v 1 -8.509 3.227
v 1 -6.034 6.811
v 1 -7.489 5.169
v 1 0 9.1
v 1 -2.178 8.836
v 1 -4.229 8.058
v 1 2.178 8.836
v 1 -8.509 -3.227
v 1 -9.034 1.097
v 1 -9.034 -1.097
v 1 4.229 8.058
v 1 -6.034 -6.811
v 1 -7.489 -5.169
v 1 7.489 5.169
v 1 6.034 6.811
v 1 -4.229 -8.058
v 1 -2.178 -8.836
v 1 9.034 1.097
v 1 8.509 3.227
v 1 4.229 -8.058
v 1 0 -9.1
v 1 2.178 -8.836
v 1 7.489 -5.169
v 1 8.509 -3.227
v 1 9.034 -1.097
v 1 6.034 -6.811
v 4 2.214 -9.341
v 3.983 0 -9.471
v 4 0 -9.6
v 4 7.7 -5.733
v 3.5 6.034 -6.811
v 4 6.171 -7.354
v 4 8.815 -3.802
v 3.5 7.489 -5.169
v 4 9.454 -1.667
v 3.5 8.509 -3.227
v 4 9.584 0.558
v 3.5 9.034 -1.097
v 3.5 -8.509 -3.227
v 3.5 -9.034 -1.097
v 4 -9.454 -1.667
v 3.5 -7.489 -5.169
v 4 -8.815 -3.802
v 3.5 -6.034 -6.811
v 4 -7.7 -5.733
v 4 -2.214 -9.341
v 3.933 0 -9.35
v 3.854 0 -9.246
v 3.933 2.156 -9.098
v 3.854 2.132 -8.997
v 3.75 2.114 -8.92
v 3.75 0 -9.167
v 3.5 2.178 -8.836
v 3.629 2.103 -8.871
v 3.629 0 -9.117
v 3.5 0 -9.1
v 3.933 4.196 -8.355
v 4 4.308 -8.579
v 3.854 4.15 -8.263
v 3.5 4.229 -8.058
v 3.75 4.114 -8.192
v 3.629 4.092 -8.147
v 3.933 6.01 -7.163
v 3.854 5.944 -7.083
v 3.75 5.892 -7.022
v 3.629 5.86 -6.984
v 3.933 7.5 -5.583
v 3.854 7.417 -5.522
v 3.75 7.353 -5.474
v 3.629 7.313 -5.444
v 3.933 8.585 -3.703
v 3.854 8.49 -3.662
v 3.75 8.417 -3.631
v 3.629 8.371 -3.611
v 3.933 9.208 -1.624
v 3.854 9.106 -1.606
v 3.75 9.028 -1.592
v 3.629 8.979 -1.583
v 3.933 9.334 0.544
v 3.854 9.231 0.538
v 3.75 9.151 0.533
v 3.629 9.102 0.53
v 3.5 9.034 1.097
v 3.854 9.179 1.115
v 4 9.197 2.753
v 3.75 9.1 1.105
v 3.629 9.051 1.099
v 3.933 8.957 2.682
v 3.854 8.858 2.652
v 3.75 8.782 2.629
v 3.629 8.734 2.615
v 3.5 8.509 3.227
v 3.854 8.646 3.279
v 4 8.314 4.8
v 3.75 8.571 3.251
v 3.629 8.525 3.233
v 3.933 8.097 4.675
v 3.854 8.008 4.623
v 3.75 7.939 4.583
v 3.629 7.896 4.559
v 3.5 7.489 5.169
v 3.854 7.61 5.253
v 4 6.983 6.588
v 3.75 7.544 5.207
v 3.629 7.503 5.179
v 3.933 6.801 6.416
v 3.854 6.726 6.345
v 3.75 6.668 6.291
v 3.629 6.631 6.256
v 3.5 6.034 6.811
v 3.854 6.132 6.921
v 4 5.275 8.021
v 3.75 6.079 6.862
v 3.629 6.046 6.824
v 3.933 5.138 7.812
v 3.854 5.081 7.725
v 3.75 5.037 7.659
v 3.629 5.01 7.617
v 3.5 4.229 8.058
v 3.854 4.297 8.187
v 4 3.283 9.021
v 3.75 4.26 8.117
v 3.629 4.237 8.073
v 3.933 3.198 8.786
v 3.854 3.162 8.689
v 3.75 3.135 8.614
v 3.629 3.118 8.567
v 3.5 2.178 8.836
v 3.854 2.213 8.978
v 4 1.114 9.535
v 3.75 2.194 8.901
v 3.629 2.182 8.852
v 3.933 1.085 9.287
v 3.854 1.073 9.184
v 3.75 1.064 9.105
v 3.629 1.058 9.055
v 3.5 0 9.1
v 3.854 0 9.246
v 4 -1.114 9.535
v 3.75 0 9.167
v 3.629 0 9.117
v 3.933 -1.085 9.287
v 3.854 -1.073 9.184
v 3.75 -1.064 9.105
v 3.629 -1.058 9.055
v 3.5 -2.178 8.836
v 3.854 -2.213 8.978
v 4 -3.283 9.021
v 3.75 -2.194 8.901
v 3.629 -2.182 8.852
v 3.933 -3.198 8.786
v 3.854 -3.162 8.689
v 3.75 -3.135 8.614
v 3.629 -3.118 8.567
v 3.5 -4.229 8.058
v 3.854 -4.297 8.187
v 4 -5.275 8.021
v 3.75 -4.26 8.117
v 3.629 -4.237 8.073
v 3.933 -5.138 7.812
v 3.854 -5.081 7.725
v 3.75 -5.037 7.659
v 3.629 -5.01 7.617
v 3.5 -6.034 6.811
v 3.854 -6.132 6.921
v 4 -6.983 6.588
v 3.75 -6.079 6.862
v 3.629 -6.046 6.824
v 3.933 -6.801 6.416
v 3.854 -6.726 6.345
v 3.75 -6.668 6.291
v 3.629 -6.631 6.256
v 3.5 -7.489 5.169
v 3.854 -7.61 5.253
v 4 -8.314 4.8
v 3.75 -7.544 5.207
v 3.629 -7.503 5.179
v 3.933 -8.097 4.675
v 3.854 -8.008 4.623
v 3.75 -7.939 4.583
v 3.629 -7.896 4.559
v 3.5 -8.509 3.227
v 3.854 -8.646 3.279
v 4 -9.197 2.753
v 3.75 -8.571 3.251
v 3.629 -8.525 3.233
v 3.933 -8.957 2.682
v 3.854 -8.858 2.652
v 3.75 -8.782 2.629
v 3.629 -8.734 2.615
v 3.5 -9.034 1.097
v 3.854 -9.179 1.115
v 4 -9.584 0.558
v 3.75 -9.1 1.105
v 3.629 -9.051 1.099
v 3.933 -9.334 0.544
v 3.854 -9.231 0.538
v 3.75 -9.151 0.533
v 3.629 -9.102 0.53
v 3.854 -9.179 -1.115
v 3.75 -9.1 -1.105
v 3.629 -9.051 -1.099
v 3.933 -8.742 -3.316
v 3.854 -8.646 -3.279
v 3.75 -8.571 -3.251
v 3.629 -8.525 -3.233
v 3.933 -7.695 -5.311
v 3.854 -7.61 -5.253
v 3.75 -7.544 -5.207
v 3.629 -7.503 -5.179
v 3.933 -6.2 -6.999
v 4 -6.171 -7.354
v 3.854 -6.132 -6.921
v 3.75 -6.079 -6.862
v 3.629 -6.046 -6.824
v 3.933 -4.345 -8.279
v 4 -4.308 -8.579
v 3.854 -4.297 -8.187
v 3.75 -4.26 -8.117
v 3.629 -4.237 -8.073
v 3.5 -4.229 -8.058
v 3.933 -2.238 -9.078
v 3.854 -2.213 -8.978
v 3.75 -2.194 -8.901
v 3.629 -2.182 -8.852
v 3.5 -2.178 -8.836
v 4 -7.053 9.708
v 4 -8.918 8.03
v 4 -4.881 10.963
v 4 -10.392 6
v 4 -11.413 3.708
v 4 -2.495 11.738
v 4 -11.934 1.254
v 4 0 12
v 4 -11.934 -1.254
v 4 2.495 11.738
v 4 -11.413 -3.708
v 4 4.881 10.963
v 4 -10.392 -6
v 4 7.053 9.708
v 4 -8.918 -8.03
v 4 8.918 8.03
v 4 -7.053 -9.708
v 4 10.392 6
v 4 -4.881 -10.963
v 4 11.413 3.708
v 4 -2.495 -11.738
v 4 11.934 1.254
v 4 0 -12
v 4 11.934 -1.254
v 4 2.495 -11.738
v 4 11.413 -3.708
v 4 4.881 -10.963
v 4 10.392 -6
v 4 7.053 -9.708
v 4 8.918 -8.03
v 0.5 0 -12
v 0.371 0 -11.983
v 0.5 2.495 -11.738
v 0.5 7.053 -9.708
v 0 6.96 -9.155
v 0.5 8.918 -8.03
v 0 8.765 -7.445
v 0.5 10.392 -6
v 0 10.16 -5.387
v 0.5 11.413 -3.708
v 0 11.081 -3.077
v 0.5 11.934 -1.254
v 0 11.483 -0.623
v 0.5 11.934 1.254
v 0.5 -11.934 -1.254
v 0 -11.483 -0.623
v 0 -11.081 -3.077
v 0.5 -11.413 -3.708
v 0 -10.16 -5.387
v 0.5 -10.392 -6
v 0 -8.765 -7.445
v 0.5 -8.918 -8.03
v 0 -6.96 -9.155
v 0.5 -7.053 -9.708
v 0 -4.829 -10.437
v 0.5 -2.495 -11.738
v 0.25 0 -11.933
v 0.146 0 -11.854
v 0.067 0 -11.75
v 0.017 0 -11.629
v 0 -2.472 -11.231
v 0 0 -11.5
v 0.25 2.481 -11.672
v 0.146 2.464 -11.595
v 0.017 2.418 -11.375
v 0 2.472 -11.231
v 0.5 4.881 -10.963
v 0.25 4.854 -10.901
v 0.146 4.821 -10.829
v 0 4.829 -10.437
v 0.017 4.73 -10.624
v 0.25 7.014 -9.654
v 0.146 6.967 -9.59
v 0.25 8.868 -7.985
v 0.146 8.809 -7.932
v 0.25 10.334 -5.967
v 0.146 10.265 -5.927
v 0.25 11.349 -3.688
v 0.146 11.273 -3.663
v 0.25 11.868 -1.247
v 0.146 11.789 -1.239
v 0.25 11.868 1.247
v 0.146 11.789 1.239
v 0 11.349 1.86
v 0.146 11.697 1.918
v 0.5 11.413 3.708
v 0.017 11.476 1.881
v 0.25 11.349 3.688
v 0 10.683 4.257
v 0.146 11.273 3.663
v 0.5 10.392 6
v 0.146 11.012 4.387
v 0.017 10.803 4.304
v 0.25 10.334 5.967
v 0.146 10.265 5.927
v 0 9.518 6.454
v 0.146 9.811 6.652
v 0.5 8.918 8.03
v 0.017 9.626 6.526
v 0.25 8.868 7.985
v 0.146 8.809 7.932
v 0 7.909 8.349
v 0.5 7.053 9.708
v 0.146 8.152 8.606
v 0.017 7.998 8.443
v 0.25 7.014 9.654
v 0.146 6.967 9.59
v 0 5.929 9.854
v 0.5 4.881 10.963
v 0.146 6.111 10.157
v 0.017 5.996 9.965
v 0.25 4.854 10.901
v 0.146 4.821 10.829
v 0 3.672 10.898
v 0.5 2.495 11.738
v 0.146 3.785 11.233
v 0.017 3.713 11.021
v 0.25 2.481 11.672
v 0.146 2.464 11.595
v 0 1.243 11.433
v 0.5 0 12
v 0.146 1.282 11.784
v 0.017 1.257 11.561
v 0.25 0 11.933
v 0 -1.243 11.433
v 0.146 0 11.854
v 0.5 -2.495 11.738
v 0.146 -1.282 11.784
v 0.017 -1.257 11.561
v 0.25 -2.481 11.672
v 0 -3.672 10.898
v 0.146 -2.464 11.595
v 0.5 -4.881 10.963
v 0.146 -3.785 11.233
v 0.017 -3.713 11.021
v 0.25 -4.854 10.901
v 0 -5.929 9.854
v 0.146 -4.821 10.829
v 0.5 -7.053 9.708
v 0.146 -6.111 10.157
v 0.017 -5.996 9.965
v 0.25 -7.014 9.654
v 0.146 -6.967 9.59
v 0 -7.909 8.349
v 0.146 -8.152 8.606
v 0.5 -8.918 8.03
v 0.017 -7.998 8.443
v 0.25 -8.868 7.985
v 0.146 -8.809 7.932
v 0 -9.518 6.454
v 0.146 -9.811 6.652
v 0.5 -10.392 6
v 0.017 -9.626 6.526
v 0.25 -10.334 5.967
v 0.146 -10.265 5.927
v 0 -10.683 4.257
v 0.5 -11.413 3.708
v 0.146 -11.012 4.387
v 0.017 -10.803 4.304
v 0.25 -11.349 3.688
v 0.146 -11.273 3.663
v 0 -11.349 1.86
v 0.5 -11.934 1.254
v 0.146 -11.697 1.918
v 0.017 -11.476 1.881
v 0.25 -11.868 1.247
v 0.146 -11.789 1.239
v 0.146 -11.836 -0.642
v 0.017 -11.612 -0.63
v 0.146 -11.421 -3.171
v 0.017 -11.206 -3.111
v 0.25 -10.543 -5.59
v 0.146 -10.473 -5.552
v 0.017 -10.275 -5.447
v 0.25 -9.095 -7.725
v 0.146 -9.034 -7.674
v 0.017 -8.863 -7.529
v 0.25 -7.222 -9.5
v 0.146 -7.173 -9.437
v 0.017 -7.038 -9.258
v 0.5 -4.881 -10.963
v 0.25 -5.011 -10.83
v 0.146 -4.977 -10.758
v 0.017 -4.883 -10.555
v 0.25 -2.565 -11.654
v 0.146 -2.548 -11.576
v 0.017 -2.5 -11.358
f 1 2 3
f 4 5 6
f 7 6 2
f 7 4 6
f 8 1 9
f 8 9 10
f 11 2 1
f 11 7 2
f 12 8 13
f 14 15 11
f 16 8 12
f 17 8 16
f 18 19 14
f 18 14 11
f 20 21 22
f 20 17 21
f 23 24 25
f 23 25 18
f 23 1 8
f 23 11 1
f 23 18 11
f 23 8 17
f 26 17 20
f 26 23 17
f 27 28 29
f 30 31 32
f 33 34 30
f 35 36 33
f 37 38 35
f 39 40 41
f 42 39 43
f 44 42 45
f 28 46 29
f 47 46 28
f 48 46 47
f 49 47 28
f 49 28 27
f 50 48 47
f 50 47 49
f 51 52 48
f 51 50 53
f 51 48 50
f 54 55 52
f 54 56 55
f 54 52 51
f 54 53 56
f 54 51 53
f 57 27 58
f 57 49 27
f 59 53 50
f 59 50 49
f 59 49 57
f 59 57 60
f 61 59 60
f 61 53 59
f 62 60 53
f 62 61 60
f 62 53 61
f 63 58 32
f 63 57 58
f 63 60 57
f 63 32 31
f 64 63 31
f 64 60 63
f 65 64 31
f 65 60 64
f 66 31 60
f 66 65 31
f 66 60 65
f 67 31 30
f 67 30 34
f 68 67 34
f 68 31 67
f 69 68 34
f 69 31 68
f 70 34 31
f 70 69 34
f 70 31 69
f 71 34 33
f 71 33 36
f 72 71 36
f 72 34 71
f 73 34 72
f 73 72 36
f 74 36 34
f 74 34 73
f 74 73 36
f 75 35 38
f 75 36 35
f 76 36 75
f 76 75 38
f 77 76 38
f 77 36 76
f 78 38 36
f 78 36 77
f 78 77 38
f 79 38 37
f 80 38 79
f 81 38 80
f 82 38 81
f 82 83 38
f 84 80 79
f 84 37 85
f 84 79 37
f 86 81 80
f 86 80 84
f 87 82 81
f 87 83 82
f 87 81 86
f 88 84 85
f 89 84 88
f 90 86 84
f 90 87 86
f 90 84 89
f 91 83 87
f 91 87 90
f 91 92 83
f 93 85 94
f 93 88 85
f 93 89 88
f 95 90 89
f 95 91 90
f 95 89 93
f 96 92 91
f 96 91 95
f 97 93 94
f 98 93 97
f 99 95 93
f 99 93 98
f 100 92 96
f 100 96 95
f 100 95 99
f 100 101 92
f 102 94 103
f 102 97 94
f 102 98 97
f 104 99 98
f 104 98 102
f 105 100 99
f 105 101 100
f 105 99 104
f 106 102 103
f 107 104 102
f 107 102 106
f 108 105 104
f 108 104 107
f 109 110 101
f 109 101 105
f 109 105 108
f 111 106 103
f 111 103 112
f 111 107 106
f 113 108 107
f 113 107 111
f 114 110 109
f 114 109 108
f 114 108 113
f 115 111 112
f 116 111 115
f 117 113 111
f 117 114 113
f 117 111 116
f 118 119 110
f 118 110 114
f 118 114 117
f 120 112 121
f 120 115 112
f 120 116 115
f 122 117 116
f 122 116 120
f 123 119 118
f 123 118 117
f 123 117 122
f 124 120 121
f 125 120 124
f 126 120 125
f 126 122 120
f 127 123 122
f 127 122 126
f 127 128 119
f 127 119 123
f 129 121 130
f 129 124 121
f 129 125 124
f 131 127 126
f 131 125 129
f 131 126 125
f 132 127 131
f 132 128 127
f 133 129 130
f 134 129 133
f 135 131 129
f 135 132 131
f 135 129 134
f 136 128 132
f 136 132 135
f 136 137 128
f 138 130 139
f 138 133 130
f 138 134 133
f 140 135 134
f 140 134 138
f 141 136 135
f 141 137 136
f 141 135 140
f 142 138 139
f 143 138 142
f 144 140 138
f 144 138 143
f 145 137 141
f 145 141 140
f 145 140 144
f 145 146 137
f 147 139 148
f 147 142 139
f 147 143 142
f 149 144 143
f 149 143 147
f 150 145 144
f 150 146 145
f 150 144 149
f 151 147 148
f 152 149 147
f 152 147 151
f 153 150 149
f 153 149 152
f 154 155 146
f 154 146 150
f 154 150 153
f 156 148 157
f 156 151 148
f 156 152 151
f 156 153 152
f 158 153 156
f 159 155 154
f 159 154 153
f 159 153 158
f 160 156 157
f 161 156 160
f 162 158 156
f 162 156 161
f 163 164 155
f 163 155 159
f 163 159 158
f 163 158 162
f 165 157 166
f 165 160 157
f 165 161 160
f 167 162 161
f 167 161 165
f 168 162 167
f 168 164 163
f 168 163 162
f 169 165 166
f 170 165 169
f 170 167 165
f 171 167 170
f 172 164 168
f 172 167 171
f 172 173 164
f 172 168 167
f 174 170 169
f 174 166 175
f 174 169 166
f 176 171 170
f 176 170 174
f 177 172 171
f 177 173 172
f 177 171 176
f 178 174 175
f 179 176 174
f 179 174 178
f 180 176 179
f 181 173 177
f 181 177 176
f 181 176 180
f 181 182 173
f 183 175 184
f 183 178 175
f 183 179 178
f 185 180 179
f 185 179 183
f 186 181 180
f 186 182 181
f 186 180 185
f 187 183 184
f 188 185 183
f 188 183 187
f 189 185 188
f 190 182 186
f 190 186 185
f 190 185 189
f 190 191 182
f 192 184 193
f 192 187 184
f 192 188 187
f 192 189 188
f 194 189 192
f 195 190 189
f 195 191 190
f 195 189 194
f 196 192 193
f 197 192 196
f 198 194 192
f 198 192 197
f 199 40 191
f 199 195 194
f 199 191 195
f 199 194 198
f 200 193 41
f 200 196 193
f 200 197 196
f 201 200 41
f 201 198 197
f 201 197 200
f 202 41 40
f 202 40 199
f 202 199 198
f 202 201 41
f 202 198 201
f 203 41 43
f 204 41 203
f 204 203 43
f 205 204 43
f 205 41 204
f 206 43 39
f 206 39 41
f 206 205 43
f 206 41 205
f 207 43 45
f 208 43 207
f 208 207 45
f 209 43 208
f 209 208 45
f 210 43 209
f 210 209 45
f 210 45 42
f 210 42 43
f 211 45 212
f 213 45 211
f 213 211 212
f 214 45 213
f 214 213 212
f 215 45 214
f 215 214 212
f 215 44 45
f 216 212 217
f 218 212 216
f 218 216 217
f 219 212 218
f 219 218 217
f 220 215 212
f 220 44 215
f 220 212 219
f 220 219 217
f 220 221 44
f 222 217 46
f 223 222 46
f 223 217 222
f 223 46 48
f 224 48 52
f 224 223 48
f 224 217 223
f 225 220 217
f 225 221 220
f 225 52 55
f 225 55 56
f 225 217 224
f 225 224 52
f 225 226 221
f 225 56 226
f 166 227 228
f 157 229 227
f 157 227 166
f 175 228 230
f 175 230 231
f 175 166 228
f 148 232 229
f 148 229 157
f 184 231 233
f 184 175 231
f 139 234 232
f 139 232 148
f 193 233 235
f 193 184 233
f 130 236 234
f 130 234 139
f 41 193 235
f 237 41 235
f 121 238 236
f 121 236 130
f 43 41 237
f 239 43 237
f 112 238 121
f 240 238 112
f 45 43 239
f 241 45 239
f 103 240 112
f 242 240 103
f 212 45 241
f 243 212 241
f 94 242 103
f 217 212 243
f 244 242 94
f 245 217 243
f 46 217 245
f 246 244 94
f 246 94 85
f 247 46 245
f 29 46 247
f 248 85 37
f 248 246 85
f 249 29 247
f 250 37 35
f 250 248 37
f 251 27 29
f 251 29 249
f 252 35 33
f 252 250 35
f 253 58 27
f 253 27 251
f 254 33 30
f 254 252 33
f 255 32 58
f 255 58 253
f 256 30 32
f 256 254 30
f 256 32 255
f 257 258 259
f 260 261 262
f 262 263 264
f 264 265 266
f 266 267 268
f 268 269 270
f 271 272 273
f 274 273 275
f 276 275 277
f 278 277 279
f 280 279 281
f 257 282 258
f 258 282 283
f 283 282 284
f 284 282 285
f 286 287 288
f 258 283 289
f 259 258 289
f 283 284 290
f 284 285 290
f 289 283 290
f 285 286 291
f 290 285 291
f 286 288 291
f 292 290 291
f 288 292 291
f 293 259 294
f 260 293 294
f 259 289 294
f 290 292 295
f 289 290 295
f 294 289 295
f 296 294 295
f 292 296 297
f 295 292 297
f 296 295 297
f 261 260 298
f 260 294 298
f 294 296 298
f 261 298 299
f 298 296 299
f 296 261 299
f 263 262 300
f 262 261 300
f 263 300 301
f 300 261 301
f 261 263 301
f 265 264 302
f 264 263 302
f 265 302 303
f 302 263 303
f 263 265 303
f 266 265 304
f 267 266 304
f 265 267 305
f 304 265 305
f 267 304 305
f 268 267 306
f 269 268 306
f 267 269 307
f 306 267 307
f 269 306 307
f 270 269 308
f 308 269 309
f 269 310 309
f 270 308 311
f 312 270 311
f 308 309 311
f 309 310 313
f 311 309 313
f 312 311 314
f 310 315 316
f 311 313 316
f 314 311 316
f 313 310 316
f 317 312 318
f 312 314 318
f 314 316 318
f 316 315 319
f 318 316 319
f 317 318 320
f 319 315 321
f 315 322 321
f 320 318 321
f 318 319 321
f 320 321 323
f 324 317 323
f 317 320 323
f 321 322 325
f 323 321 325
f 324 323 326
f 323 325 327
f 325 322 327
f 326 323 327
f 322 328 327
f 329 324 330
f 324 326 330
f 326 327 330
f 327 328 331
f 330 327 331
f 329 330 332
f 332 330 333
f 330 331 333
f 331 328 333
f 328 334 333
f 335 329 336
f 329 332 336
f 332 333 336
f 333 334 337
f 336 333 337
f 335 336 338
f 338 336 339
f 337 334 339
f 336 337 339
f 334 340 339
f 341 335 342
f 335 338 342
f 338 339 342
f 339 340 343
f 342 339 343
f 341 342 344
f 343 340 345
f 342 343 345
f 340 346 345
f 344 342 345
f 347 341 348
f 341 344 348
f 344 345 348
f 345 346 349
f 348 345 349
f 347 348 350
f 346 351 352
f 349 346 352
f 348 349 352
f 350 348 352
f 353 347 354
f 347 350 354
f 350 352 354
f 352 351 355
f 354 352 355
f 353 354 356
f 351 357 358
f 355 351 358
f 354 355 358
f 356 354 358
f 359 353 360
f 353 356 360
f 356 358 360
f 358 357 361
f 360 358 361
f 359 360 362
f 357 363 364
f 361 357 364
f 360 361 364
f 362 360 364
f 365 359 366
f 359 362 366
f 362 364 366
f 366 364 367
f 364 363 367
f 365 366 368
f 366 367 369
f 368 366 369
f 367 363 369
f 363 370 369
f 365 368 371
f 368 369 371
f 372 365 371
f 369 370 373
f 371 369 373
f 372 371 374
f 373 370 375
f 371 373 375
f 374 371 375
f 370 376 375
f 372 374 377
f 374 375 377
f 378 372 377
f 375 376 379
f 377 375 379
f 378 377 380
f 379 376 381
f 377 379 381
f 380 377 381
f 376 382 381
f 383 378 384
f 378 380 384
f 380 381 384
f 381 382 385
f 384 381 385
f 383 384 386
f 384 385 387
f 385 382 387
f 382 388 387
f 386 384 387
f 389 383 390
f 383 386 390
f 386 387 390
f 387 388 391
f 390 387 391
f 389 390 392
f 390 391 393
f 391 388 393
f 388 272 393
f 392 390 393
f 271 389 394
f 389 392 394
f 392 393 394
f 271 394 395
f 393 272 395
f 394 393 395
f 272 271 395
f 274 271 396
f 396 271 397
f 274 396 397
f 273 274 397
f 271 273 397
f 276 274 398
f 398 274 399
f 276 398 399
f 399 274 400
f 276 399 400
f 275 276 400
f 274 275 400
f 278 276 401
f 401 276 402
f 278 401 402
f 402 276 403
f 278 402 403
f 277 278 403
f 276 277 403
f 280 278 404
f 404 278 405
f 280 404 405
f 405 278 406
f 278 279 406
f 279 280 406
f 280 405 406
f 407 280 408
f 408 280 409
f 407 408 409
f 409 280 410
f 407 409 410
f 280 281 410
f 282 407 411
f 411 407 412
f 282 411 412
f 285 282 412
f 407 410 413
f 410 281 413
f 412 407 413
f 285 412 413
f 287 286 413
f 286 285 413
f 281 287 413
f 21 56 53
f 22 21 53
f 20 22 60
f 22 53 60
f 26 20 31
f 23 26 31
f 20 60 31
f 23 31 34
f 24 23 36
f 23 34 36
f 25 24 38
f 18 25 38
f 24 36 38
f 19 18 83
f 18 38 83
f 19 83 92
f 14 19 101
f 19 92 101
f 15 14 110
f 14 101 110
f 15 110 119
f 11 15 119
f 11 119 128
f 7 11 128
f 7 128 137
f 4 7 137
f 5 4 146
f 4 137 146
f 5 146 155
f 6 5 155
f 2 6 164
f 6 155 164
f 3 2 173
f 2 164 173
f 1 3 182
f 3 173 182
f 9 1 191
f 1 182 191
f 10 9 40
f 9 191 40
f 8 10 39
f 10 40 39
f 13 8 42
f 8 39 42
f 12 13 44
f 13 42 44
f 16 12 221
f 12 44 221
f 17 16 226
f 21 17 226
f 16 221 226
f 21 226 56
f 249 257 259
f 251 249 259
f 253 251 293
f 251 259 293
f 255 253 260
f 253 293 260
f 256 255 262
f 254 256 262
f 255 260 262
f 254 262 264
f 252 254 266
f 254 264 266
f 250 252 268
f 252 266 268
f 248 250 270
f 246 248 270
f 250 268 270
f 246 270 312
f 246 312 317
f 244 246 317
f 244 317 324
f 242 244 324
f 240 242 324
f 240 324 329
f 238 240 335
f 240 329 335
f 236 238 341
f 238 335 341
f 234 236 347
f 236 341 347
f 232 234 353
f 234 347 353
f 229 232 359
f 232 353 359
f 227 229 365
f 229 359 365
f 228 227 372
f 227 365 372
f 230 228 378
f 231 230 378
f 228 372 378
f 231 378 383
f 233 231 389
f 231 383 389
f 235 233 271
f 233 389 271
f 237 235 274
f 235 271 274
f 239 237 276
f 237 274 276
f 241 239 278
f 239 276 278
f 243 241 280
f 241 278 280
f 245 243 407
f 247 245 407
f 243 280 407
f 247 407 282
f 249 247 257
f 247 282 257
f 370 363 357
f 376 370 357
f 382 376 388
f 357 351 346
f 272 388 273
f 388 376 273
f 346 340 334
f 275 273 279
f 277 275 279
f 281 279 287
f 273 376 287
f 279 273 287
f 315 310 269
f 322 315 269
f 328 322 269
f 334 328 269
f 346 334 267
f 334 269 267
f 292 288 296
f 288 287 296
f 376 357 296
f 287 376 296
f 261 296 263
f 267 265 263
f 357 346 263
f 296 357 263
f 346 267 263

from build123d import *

# Parameters (mm, degrees)
SKETCH_1_R          = 12
EXTRUDE_1_DEPTH     = 4
SKETCH_2_R          = 9.1
CUT_EXTRUDE_1_DEPTH = 3
FILLET_1_R          = 0.5
FILLET_2_R          = 0.5


with BuildPart() as part:
    # 草图1 → 凸台-拉伸1 (new body)
    with BuildSketch(Plane(origin=(0, 0, 0), x_dir=(0, 0, -1), z_dir=(1, 0, 0))):
        Circle(SKETCH_1_R)
    extrude(amount=EXTRUDE_1_DEPTH)

    # 草图2 → 切除-拉伸1 (cut)
    with BuildSketch(Plane(origin=(4, 0, 0), x_dir=(0, 0, -1), z_dir=(1, 0, 0))):
        Circle(SKETCH_2_R)
    extrude(amount=-CUT_EXTRUDE_1_DEPTH, mode=Mode.SUBTRACT)

    # 圆角1
    fillet_1_edges = [part.edges().sort_by_distance(p)[0] for p in [
        (4, 0, 9.1),
    ]]
    fillet(fillet_1_edges, radius=FILLET_1_R)

    # 圆角2
    fillet_2_edges = [part.edges().sort_by_distance(p)[0] for p in [
        (0, 0, 12),
    ]]
    fillet(fillet_2_edges, radius=FILLET_2_R)


solid = part.part
